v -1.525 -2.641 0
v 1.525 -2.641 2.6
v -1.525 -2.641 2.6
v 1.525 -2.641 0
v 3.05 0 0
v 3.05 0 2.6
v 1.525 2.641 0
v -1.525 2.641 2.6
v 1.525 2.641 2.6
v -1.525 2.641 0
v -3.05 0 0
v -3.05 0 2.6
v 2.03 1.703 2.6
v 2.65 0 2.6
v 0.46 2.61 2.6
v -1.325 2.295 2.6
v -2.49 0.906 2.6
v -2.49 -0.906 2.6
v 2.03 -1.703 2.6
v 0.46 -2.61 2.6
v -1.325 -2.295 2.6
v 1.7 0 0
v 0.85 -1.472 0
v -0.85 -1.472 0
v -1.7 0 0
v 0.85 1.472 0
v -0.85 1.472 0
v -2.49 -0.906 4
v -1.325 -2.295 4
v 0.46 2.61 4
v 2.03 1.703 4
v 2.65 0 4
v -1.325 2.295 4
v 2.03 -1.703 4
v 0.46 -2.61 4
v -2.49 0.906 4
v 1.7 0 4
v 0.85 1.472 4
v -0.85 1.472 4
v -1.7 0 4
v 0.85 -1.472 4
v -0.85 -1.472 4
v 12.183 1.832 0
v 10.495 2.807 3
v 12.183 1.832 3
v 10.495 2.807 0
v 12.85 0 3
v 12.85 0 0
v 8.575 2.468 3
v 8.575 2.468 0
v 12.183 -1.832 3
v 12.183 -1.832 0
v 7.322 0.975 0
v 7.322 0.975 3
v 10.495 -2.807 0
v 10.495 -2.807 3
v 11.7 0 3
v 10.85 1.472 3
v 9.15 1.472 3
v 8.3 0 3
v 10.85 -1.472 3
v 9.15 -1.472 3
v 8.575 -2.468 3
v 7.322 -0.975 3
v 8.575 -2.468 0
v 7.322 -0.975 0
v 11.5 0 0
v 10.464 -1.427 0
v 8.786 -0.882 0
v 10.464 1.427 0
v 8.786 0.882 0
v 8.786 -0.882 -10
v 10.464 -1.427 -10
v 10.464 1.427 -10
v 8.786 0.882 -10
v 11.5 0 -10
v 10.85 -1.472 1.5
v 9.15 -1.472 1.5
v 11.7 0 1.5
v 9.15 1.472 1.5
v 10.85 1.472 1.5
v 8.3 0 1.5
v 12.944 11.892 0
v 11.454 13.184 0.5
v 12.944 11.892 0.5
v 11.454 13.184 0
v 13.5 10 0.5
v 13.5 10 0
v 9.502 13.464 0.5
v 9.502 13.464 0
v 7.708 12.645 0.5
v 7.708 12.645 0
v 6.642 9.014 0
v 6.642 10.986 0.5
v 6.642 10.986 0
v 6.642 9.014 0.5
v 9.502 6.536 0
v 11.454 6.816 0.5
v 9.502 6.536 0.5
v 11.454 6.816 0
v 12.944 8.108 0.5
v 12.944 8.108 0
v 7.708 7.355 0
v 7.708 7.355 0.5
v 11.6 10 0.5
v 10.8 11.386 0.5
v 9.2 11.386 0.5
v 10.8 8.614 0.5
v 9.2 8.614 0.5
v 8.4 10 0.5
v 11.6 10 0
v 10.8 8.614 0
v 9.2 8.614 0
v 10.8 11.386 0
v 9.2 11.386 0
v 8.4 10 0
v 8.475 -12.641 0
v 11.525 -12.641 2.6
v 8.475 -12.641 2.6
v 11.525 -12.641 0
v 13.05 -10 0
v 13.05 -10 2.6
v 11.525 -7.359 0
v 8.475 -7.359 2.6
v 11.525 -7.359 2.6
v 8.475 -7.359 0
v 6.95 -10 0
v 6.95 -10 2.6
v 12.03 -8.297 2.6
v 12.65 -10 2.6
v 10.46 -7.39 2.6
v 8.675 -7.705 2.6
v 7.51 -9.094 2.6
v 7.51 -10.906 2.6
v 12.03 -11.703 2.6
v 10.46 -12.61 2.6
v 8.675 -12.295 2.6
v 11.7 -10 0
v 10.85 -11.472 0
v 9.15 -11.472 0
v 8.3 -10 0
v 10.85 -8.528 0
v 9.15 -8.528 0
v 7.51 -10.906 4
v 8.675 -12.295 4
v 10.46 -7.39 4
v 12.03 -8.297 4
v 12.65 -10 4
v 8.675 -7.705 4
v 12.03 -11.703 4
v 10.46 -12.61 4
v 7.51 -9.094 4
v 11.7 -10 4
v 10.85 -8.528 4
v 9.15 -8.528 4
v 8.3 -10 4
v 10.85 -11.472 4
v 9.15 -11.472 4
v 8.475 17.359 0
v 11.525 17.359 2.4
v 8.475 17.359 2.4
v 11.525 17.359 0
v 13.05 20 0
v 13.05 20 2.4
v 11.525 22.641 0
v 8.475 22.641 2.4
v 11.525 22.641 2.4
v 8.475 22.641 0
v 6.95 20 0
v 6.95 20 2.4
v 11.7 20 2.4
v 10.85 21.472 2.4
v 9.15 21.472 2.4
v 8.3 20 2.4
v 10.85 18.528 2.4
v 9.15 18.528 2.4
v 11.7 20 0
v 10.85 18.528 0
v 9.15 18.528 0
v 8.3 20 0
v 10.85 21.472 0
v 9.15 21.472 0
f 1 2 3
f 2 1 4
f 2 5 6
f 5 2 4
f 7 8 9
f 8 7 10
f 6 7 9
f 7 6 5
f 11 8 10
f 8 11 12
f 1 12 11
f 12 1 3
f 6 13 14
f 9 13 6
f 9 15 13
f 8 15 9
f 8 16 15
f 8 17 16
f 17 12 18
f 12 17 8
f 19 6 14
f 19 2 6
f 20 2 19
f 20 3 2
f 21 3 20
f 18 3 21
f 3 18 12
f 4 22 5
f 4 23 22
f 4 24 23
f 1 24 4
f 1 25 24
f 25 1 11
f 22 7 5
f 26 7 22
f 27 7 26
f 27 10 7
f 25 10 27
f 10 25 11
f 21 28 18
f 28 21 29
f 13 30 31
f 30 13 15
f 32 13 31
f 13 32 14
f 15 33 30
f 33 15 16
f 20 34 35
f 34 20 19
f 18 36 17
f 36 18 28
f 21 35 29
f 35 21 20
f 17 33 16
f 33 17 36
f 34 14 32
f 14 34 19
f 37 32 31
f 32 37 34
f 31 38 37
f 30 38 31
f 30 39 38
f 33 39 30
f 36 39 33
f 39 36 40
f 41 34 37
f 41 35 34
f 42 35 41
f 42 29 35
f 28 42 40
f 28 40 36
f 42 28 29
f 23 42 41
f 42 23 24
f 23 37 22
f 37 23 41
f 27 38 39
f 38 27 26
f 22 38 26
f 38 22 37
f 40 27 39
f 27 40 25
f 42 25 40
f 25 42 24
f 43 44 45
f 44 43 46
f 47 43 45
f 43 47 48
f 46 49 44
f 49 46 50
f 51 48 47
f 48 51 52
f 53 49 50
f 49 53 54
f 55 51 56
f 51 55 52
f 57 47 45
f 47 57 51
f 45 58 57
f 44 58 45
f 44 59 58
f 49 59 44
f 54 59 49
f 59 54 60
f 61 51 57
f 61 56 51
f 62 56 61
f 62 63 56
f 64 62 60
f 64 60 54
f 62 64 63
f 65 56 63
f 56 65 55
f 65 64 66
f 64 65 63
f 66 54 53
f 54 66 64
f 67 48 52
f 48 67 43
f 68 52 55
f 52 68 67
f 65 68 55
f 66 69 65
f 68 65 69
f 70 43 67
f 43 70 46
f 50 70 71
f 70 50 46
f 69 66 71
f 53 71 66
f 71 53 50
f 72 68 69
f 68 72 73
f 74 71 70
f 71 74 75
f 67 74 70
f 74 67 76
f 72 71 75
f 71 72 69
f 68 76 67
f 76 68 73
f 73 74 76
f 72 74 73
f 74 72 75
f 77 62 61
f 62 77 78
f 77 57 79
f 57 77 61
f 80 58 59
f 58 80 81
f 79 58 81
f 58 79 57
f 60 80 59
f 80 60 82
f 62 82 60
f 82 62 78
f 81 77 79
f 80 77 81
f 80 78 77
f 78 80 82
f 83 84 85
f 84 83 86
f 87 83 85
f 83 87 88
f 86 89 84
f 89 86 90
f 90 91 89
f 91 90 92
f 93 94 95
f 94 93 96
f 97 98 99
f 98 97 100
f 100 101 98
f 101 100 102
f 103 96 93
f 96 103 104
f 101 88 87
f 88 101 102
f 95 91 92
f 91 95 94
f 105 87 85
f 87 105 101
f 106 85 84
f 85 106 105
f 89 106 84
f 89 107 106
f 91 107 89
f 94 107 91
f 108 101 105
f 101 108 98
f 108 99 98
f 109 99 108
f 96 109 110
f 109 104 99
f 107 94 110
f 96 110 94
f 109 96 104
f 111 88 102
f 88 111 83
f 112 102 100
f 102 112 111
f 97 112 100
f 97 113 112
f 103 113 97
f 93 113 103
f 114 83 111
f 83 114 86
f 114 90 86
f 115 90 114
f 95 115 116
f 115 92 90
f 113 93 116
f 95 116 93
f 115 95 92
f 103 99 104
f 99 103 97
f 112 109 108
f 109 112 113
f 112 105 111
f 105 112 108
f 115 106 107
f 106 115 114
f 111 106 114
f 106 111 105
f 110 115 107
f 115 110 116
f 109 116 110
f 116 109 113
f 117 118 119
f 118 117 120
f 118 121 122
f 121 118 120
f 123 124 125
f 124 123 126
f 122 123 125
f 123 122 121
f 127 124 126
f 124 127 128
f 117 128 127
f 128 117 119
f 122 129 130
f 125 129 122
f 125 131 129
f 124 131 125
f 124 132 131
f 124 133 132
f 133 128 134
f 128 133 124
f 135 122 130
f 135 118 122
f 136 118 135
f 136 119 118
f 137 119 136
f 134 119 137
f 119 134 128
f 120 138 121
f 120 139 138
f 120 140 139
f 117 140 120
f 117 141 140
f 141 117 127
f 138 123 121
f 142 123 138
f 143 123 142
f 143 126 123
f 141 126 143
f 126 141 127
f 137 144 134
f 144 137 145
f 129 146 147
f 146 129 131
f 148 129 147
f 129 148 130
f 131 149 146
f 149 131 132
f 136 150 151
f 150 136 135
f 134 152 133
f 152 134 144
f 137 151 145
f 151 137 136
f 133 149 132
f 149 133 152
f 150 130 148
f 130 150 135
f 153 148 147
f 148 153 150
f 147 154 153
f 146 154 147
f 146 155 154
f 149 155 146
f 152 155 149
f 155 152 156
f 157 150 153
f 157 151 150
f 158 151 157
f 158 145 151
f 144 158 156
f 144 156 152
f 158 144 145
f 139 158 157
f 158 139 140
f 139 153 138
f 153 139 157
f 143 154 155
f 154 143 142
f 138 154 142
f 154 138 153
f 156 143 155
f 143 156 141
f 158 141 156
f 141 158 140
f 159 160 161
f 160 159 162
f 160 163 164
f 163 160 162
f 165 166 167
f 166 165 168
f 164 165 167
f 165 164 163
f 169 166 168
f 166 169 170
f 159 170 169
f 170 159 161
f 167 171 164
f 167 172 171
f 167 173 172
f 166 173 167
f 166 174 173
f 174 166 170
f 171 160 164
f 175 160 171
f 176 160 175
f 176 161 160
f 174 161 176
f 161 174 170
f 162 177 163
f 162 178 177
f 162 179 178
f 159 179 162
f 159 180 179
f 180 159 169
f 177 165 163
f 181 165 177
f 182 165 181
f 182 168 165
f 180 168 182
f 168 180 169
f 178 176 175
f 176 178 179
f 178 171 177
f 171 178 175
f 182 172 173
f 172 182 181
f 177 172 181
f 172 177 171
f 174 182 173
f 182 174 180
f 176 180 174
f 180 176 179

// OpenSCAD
// Common Fixings Library

//$fa = 6;
//$fs = 0.4;

m3_nyloc();
translate([10,0,0]) m3_bolt();
translate([10,10,0]) m3_washer();
translate([10,-10,0]) m3_nyloc();
translate([10,20,0]) m3_nut();

module m3_washer(){
    difference(){
        cylinder(d=7, h=0.5);
        translate([0,0,-0.2]) cylinder(d=3.2, h=1);
        }
}

module m3_bolt(l=10){
    difference(){
        union(){
            cylinder(d=5.7, h=3);
            translate([0,0,-l]) cylinder(d=3, h=l);
            }
        translate([0,0,1.5]) cylinder(d=3.4, h=3, $fn=6);
        }
}

module m3_nyloc(){
    difference(){
        union(){
            cylinder(d=6.1, h=2.6, $fn=6);
            cylinder(d=5.3, h=4);
            }
        cylinder(d=3.4, h=6);
        }
}

module m3_nut(){
    difference(){
        union(){
            cylinder(d=6.1, h=2.4, $fn=6);
            }
        cylinder(d=3.4, h=6);
        }
}
